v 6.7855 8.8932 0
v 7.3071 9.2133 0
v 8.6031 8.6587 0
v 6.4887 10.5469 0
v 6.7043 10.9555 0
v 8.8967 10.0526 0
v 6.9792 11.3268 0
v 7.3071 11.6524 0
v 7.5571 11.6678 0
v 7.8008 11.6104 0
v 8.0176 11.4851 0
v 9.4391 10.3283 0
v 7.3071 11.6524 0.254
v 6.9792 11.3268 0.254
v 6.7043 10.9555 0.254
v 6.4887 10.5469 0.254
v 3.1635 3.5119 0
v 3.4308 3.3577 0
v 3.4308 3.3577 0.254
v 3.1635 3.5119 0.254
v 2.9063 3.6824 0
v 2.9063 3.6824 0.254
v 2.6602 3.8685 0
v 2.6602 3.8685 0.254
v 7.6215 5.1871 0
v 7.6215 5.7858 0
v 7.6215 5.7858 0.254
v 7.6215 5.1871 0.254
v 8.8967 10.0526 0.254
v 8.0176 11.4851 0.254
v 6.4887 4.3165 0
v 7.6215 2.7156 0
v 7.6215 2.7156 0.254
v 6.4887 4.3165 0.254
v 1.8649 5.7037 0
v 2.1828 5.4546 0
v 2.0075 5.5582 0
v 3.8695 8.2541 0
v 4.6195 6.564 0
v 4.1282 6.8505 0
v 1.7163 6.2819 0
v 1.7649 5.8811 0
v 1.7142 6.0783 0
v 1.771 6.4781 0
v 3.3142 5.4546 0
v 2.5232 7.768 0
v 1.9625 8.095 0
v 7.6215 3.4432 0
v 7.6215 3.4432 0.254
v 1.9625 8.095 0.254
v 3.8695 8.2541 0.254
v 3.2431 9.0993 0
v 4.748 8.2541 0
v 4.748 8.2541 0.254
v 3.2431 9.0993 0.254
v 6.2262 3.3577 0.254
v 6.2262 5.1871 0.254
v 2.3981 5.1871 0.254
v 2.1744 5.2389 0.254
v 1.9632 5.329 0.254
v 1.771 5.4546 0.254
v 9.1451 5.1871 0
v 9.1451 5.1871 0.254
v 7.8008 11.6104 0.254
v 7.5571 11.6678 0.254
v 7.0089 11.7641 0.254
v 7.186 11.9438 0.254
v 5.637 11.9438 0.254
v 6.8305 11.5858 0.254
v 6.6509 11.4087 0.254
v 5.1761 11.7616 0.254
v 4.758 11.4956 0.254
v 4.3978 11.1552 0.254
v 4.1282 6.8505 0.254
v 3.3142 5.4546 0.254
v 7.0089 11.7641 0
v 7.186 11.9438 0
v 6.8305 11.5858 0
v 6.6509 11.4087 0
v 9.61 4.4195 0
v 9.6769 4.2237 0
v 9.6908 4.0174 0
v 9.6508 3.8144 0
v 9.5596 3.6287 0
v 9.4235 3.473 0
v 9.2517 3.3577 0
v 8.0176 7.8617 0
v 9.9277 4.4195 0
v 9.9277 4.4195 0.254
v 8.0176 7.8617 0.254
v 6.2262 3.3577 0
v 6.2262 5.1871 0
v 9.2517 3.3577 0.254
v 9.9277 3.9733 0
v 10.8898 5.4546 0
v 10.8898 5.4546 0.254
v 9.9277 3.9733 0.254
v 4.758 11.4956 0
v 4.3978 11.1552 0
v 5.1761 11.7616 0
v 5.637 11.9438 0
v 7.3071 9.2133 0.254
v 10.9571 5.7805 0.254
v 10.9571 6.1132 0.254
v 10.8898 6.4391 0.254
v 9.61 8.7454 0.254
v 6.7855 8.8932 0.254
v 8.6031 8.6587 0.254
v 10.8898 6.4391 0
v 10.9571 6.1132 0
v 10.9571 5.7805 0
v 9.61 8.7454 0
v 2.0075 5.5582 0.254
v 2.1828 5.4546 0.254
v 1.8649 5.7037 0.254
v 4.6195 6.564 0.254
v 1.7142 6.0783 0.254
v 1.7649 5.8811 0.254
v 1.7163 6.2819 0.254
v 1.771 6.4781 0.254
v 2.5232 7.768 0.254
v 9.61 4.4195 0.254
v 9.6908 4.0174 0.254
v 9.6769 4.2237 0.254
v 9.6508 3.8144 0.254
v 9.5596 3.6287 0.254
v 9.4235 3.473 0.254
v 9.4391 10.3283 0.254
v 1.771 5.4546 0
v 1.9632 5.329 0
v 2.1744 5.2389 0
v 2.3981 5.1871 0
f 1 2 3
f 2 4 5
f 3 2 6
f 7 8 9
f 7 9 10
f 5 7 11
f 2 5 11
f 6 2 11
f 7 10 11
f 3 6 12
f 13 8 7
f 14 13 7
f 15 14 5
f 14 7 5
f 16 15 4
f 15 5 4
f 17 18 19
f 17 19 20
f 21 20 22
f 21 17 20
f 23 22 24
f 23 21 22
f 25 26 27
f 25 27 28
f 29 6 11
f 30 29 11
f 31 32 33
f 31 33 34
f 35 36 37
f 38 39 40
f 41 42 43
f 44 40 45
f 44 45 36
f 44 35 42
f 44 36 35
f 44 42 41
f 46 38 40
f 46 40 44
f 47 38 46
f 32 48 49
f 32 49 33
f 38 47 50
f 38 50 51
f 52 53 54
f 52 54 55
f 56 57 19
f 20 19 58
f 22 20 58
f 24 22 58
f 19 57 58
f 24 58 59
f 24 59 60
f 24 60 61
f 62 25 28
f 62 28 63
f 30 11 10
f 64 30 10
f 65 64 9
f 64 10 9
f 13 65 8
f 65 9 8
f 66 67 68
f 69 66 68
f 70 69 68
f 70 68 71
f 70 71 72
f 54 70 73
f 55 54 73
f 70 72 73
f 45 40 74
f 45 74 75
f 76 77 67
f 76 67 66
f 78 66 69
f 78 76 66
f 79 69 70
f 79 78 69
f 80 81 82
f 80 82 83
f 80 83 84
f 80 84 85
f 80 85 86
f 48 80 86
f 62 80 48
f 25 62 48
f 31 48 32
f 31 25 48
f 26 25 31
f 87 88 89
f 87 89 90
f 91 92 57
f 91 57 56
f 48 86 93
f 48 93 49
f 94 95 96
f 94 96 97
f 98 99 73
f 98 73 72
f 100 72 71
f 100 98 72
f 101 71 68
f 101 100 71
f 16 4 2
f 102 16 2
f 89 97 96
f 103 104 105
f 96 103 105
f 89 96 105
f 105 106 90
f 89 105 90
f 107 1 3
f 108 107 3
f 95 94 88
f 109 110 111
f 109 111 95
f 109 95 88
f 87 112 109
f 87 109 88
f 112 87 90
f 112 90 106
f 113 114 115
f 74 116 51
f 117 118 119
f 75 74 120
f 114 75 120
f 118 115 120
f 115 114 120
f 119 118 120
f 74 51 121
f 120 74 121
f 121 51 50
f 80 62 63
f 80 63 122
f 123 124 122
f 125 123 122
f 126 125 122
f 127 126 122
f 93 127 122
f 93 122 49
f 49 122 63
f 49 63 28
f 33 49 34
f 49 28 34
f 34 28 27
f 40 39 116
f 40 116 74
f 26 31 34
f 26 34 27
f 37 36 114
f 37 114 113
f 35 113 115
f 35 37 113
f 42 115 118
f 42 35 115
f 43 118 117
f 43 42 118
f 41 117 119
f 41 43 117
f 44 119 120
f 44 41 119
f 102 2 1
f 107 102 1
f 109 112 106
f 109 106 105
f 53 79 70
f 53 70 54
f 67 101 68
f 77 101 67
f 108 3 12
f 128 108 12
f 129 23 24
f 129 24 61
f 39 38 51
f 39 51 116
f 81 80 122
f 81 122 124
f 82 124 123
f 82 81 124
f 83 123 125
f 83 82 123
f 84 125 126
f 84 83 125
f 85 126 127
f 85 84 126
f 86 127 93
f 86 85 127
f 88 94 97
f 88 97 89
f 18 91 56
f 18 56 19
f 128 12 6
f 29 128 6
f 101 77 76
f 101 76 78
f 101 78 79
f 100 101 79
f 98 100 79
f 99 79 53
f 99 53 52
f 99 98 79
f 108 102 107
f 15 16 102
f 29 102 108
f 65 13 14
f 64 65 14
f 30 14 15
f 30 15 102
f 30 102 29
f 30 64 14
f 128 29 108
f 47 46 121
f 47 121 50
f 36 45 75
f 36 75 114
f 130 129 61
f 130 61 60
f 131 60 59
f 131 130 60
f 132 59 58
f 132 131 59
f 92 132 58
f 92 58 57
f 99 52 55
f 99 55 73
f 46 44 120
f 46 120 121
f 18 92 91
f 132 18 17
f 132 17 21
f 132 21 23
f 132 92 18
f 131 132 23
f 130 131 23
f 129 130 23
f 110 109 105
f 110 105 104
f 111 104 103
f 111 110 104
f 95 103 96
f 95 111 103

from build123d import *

# Parameters (mm, degrees)
BOSS_EXTRUDE1_DEPTH   = 0.254
BOSS_EXTRUDE1_2_DEPTH = 0.254
BOSS_EXTRUDE1_3_DEPTH = 0.254
BOSS_EXTRUDE1_4_DEPTH = 0.254
BOSS_EXTRUDE1_5_DEPTH = 0.254
BOSS_EXTRUDE1_6_DEPTH = 0.254


with BuildPart() as part:
    # Sketch1 → Boss-Extrude1 (new body)
    with BuildSketch(Plane.XY):
        with BuildLine():
            Line((5.637000935, 11.943781458), (7.185995863, 11.943781458))
            ThreePointArc((7.185995863, 11.943781458), (6.919891183, 11.674778799), (6.650888524, 11.408674119))
            Line((6.650888524, 11.408674119), (4.747952976, 8.254071924))
            Line((4.747952976, 8.254071924), (3.243099683, 9.0992635))
            Line((3.243099683, 9.0992635), (4.397804993, 11.155202222))
            ThreePointArc((4.397804993, 11.155202222), (4.960721662, 11.638562457), (5.637000935, 11.943781458))
        make_face()
    extrude(amount=BOSS_EXTRUDE1_DEPTH)


with BuildPart() as body_2:
    # Sketch1 → Boss-Extrude1 2 (new body)
    with BuildSketch(Plane.XY):
        with BuildLine():
            Line((6.48874249, 10.5468587), (7.307105521, 9.213267603))
            Line((7.307105521, 9.213267603), (6.785548208, 8.893212059))
            Line((6.785548208, 8.893212059), (8.603076052, 8.658733216))
            Line((8.603076052, 8.658733216), (9.439062626, 10.328298615))
            Line((9.439062626, 10.328298615), (8.89668655, 10.052613091))
            Line((8.89668655, 10.052613091), (8.017649291, 11.485077924))
            ThreePointArc((8.017649291, 11.485077924), (7.681060328, 11.64807643), (7.307105521, 11.652371198))
            ThreePointArc((7.307105521, 11.652371198), (6.834746968, 11.146382174), (6.48874249, 10.5468587))
        make_face()
    extrude(amount=BOSS_EXTRUDE1_2_DEPTH)


with BuildPart() as body_3:
    # Sketch1 → Boss-Extrude1 3 (new body)
    with BuildSketch(Plane.XY):
        with BuildLine():
            Line((8.017649291, 7.861746009), (9.610046163, 8.745368466))
            Line((9.610046163, 8.745368466), (10.889800345, 6.439093267))
            ThreePointArc((10.889800345, 6.439093267), (10.965604743, 5.946852431), (10.889800345, 5.454611596))
            Line((10.889800345, 5.454611596), (9.927748084, 3.973263118))
            Line((9.927748084, 3.973263118), (9.927748084, 4.419511916))
            Line((9.927748084, 4.419511916), (8.017649291, 7.861746009))
        make_face()
    extrude(amount=BOSS_EXTRUDE1_3_DEPTH)


with BuildPart() as body_4:
    # Sketch1 → Boss-Extrude1 4 (new body)
    with BuildSketch(Plane.XY):
        with BuildLine():
            Line((7.621464325, 5.187129092), (9.145128923, 5.187129092))
            Line((9.145128923, 5.187129092), (9.610046163, 4.419511916))
            ThreePointArc((9.610046163, 4.419511916), (9.650762974, 3.814407191), (9.251680452, 3.357742403))
            Line((9.251680452, 3.357742403), (7.621464325, 3.443237722))
            Line((7.621464325, 3.443237722), (7.621464325, 2.715572638))
            Line((7.621464325, 2.715572638), (6.48874249, 4.316477857))
            Line((6.48874249, 4.316477857), (7.621464325, 5.785785902))
            Line((7.621464325, 5.785785902), (7.621464325, 5.187129092))
        make_face()
    extrude(amount=BOSS_EXTRUDE1_4_DEPTH)


with BuildPart() as body_5:
    # Sketch1 → Boss-Extrude1 5 (new body)
    with BuildSketch(Plane.XY):
        with BuildLine():
            Line((1.962512056, 8.094982994), (3.869542298, 8.254071924))
            Line((3.869542298, 8.254071924), (4.619508312, 6.563952326))
            Line((4.619508312, 6.563952326), (4.12815791, 6.850481717))
            Line((4.12815791, 6.850481717), (3.314160785, 5.454611596))
            Line((3.314160785, 5.454611596), (2.182778024, 5.454611596))
            ThreePointArc((2.182778024, 5.454611596), (1.764914266, 5.881076175), (1.770995964, 6.478106467))
            Line((1.770995964, 6.478106467), (2.523203463, 7.768017622))
            Line((2.523203463, 7.768017622), (1.962512056, 8.094982994))
        make_face()
    extrude(amount=BOSS_EXTRUDE1_5_DEPTH)


with BuildPart() as body_6:
    # Sketch1 → Boss-Extrude1 6 (new body)
    with BuildSketch(Plane.XY):
        with BuildLine():
            Line((6.226223733, 5.187129092), (6.226223733, 3.357742403))
            Line((6.226223733, 3.357742403), (3.430797167, 3.357742403))
            ThreePointArc((3.430797167, 3.357742403), (3.03357937, 3.595122118), (2.660195359, 3.868463459))
            Line((2.660195359, 3.868463459), (1.770995964, 5.454611596))
            ThreePointArc((1.770995964, 5.454611596), (2.066843427, 5.279302969), (2.398148139, 5.187129092))
            Line((2.398148139, 5.187129092), (6.226223733, 5.187129092))
        make_face()
    extrude(amount=BOSS_EXTRUDE1_6_DEPTH)


solid = Compound([part.part, body_2.part, body_3.part, body_4.part, body_5.part, body_6.part])
